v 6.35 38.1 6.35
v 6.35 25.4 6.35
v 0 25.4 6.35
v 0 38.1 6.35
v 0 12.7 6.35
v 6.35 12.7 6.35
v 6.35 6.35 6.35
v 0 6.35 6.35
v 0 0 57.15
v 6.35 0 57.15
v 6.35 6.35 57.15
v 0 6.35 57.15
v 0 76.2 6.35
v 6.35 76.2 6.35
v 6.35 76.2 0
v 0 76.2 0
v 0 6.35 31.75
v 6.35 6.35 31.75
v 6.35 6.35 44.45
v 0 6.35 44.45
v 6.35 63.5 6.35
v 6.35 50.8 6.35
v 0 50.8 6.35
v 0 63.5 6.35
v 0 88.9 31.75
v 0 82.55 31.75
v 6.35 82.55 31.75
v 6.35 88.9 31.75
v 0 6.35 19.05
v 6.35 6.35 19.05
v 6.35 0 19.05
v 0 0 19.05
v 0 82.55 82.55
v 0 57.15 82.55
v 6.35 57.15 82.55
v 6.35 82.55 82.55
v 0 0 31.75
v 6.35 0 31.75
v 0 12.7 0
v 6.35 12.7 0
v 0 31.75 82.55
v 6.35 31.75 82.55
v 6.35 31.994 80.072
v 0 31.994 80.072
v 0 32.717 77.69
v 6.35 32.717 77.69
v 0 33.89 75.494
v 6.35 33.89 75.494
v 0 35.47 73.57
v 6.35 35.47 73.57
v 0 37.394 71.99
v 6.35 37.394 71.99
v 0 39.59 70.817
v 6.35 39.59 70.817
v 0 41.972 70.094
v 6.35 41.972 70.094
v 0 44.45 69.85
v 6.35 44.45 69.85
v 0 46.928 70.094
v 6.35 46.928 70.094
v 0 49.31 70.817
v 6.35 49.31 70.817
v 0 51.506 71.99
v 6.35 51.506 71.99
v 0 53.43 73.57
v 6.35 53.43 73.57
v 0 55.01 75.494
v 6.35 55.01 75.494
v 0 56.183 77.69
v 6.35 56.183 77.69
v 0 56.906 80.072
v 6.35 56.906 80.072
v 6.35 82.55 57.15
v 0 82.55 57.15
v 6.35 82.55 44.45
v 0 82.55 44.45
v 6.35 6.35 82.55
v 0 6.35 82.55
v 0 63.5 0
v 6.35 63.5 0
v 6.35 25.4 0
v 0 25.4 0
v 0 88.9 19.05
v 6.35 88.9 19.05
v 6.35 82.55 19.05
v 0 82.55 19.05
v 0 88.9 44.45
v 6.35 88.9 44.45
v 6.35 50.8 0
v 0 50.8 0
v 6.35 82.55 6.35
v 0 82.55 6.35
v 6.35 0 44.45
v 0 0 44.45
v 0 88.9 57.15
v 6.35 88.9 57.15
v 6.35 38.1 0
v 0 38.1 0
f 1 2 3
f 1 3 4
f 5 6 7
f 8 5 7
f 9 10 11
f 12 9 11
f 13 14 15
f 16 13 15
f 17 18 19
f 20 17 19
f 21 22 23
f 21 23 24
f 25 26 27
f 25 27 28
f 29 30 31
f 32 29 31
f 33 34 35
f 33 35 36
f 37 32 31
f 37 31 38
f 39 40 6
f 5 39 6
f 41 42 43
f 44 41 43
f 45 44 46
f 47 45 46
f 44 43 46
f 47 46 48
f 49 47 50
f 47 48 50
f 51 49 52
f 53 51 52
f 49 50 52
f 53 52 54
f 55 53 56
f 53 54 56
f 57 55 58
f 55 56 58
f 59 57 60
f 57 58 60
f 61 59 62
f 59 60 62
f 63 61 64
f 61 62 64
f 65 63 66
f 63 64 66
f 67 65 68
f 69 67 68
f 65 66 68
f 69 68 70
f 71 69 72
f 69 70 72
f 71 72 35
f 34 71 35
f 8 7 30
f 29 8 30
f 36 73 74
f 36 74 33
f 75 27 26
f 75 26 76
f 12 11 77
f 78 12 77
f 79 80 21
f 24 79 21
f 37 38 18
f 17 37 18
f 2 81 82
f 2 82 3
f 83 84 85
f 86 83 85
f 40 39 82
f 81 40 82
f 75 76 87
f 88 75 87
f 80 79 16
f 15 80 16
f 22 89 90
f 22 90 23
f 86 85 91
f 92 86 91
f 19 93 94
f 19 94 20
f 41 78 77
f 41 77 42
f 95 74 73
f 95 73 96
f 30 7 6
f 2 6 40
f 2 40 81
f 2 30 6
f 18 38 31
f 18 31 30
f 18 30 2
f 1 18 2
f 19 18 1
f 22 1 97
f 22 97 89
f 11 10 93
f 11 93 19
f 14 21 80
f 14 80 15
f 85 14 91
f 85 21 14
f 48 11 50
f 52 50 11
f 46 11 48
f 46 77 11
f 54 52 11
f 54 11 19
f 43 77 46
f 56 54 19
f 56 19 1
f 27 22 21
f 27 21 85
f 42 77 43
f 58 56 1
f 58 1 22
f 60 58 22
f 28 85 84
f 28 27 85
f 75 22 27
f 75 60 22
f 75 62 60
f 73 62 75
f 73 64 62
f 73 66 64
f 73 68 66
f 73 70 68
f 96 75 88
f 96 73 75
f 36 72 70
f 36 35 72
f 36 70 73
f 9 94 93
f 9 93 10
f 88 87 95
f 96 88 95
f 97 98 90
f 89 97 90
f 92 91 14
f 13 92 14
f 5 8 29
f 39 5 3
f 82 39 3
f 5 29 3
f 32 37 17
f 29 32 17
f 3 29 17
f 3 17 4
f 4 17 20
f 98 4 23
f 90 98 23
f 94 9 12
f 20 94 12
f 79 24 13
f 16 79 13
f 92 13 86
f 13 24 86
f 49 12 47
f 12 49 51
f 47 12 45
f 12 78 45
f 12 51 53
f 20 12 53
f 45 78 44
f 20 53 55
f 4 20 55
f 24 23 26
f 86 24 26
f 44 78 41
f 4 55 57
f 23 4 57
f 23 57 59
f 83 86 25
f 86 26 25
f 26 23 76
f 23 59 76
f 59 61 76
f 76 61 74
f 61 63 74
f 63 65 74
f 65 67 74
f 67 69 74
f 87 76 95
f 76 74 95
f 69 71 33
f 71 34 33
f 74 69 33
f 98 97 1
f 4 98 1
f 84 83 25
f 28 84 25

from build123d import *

# Parameters (mm, degrees)
SKETCH1_W           = 88.9
SKETCH1_H           = 82.55
BOSS_EXTRUDE1_DEPTH = 6.35
SKETCH2_R           = 12.7
SKETCH2_W           = 12.7
SKETCH2_H           = 6.35
SKETCH2_W_2         = 6.35
SKETCH2_H_2         = 25.4
SKETCH2_H_3         = 12.7
CUT_EXTRUDE2_DEPTH  = 6.35


with BuildPart() as part:
    # Sketch1 → Boss-Extrude1 (new body)
    with BuildSketch(Plane.YZ):
        with Locations((44.45, 41.275)):
            Rectangle(SKETCH1_W, SKETCH1_H)
    extrude(amount=BOSS_EXTRUDE1_DEPTH)

    # Sketch2 → Cut-Extrude2 (cut)
    with BuildSketch(Plane.YZ.offset(6.35)):
        with Locations((44.45, 82.55)):
            Circle(SKETCH2_R)
        with Locations((57.15, 3.175)):
            Rectangle(SKETCH2_W, SKETCH2_H)
        with Locations((31.75, 3.175)):
            Rectangle(SKETCH2_W, SKETCH2_H)
        Polygon((0, 0), (12.7, 0), (12.7, 6.35), (6.35, 6.35), (6.35, 19.05), (0, 19.05), (0, 6.35), align=None)
        Polygon((76.2, 0), (88.9, 0), (88.9, 6.35), (88.9, 19.05), (82.55, 19.05), (82.55, 6.35), (76.2, 6.35), align=None)
        with Locations((3.175, 69.85)):
            Rectangle(SKETCH2_W_2, SKETCH2_H_2)
        with Locations((3.175, 38.1)):
            Rectangle(SKETCH2_W_2, SKETCH2_H_3)
        with Locations((85.725, 38.1)):
            Rectangle(SKETCH2_W_2, SKETCH2_H_3)
        with Locations((85.725, 69.85)):
            Rectangle(SKETCH2_W_2, SKETCH2_H_2)
    extrude(amount=-CUT_EXTRUDE2_DEPTH, mode=Mode.SUBTRACT)


solid = part.part
